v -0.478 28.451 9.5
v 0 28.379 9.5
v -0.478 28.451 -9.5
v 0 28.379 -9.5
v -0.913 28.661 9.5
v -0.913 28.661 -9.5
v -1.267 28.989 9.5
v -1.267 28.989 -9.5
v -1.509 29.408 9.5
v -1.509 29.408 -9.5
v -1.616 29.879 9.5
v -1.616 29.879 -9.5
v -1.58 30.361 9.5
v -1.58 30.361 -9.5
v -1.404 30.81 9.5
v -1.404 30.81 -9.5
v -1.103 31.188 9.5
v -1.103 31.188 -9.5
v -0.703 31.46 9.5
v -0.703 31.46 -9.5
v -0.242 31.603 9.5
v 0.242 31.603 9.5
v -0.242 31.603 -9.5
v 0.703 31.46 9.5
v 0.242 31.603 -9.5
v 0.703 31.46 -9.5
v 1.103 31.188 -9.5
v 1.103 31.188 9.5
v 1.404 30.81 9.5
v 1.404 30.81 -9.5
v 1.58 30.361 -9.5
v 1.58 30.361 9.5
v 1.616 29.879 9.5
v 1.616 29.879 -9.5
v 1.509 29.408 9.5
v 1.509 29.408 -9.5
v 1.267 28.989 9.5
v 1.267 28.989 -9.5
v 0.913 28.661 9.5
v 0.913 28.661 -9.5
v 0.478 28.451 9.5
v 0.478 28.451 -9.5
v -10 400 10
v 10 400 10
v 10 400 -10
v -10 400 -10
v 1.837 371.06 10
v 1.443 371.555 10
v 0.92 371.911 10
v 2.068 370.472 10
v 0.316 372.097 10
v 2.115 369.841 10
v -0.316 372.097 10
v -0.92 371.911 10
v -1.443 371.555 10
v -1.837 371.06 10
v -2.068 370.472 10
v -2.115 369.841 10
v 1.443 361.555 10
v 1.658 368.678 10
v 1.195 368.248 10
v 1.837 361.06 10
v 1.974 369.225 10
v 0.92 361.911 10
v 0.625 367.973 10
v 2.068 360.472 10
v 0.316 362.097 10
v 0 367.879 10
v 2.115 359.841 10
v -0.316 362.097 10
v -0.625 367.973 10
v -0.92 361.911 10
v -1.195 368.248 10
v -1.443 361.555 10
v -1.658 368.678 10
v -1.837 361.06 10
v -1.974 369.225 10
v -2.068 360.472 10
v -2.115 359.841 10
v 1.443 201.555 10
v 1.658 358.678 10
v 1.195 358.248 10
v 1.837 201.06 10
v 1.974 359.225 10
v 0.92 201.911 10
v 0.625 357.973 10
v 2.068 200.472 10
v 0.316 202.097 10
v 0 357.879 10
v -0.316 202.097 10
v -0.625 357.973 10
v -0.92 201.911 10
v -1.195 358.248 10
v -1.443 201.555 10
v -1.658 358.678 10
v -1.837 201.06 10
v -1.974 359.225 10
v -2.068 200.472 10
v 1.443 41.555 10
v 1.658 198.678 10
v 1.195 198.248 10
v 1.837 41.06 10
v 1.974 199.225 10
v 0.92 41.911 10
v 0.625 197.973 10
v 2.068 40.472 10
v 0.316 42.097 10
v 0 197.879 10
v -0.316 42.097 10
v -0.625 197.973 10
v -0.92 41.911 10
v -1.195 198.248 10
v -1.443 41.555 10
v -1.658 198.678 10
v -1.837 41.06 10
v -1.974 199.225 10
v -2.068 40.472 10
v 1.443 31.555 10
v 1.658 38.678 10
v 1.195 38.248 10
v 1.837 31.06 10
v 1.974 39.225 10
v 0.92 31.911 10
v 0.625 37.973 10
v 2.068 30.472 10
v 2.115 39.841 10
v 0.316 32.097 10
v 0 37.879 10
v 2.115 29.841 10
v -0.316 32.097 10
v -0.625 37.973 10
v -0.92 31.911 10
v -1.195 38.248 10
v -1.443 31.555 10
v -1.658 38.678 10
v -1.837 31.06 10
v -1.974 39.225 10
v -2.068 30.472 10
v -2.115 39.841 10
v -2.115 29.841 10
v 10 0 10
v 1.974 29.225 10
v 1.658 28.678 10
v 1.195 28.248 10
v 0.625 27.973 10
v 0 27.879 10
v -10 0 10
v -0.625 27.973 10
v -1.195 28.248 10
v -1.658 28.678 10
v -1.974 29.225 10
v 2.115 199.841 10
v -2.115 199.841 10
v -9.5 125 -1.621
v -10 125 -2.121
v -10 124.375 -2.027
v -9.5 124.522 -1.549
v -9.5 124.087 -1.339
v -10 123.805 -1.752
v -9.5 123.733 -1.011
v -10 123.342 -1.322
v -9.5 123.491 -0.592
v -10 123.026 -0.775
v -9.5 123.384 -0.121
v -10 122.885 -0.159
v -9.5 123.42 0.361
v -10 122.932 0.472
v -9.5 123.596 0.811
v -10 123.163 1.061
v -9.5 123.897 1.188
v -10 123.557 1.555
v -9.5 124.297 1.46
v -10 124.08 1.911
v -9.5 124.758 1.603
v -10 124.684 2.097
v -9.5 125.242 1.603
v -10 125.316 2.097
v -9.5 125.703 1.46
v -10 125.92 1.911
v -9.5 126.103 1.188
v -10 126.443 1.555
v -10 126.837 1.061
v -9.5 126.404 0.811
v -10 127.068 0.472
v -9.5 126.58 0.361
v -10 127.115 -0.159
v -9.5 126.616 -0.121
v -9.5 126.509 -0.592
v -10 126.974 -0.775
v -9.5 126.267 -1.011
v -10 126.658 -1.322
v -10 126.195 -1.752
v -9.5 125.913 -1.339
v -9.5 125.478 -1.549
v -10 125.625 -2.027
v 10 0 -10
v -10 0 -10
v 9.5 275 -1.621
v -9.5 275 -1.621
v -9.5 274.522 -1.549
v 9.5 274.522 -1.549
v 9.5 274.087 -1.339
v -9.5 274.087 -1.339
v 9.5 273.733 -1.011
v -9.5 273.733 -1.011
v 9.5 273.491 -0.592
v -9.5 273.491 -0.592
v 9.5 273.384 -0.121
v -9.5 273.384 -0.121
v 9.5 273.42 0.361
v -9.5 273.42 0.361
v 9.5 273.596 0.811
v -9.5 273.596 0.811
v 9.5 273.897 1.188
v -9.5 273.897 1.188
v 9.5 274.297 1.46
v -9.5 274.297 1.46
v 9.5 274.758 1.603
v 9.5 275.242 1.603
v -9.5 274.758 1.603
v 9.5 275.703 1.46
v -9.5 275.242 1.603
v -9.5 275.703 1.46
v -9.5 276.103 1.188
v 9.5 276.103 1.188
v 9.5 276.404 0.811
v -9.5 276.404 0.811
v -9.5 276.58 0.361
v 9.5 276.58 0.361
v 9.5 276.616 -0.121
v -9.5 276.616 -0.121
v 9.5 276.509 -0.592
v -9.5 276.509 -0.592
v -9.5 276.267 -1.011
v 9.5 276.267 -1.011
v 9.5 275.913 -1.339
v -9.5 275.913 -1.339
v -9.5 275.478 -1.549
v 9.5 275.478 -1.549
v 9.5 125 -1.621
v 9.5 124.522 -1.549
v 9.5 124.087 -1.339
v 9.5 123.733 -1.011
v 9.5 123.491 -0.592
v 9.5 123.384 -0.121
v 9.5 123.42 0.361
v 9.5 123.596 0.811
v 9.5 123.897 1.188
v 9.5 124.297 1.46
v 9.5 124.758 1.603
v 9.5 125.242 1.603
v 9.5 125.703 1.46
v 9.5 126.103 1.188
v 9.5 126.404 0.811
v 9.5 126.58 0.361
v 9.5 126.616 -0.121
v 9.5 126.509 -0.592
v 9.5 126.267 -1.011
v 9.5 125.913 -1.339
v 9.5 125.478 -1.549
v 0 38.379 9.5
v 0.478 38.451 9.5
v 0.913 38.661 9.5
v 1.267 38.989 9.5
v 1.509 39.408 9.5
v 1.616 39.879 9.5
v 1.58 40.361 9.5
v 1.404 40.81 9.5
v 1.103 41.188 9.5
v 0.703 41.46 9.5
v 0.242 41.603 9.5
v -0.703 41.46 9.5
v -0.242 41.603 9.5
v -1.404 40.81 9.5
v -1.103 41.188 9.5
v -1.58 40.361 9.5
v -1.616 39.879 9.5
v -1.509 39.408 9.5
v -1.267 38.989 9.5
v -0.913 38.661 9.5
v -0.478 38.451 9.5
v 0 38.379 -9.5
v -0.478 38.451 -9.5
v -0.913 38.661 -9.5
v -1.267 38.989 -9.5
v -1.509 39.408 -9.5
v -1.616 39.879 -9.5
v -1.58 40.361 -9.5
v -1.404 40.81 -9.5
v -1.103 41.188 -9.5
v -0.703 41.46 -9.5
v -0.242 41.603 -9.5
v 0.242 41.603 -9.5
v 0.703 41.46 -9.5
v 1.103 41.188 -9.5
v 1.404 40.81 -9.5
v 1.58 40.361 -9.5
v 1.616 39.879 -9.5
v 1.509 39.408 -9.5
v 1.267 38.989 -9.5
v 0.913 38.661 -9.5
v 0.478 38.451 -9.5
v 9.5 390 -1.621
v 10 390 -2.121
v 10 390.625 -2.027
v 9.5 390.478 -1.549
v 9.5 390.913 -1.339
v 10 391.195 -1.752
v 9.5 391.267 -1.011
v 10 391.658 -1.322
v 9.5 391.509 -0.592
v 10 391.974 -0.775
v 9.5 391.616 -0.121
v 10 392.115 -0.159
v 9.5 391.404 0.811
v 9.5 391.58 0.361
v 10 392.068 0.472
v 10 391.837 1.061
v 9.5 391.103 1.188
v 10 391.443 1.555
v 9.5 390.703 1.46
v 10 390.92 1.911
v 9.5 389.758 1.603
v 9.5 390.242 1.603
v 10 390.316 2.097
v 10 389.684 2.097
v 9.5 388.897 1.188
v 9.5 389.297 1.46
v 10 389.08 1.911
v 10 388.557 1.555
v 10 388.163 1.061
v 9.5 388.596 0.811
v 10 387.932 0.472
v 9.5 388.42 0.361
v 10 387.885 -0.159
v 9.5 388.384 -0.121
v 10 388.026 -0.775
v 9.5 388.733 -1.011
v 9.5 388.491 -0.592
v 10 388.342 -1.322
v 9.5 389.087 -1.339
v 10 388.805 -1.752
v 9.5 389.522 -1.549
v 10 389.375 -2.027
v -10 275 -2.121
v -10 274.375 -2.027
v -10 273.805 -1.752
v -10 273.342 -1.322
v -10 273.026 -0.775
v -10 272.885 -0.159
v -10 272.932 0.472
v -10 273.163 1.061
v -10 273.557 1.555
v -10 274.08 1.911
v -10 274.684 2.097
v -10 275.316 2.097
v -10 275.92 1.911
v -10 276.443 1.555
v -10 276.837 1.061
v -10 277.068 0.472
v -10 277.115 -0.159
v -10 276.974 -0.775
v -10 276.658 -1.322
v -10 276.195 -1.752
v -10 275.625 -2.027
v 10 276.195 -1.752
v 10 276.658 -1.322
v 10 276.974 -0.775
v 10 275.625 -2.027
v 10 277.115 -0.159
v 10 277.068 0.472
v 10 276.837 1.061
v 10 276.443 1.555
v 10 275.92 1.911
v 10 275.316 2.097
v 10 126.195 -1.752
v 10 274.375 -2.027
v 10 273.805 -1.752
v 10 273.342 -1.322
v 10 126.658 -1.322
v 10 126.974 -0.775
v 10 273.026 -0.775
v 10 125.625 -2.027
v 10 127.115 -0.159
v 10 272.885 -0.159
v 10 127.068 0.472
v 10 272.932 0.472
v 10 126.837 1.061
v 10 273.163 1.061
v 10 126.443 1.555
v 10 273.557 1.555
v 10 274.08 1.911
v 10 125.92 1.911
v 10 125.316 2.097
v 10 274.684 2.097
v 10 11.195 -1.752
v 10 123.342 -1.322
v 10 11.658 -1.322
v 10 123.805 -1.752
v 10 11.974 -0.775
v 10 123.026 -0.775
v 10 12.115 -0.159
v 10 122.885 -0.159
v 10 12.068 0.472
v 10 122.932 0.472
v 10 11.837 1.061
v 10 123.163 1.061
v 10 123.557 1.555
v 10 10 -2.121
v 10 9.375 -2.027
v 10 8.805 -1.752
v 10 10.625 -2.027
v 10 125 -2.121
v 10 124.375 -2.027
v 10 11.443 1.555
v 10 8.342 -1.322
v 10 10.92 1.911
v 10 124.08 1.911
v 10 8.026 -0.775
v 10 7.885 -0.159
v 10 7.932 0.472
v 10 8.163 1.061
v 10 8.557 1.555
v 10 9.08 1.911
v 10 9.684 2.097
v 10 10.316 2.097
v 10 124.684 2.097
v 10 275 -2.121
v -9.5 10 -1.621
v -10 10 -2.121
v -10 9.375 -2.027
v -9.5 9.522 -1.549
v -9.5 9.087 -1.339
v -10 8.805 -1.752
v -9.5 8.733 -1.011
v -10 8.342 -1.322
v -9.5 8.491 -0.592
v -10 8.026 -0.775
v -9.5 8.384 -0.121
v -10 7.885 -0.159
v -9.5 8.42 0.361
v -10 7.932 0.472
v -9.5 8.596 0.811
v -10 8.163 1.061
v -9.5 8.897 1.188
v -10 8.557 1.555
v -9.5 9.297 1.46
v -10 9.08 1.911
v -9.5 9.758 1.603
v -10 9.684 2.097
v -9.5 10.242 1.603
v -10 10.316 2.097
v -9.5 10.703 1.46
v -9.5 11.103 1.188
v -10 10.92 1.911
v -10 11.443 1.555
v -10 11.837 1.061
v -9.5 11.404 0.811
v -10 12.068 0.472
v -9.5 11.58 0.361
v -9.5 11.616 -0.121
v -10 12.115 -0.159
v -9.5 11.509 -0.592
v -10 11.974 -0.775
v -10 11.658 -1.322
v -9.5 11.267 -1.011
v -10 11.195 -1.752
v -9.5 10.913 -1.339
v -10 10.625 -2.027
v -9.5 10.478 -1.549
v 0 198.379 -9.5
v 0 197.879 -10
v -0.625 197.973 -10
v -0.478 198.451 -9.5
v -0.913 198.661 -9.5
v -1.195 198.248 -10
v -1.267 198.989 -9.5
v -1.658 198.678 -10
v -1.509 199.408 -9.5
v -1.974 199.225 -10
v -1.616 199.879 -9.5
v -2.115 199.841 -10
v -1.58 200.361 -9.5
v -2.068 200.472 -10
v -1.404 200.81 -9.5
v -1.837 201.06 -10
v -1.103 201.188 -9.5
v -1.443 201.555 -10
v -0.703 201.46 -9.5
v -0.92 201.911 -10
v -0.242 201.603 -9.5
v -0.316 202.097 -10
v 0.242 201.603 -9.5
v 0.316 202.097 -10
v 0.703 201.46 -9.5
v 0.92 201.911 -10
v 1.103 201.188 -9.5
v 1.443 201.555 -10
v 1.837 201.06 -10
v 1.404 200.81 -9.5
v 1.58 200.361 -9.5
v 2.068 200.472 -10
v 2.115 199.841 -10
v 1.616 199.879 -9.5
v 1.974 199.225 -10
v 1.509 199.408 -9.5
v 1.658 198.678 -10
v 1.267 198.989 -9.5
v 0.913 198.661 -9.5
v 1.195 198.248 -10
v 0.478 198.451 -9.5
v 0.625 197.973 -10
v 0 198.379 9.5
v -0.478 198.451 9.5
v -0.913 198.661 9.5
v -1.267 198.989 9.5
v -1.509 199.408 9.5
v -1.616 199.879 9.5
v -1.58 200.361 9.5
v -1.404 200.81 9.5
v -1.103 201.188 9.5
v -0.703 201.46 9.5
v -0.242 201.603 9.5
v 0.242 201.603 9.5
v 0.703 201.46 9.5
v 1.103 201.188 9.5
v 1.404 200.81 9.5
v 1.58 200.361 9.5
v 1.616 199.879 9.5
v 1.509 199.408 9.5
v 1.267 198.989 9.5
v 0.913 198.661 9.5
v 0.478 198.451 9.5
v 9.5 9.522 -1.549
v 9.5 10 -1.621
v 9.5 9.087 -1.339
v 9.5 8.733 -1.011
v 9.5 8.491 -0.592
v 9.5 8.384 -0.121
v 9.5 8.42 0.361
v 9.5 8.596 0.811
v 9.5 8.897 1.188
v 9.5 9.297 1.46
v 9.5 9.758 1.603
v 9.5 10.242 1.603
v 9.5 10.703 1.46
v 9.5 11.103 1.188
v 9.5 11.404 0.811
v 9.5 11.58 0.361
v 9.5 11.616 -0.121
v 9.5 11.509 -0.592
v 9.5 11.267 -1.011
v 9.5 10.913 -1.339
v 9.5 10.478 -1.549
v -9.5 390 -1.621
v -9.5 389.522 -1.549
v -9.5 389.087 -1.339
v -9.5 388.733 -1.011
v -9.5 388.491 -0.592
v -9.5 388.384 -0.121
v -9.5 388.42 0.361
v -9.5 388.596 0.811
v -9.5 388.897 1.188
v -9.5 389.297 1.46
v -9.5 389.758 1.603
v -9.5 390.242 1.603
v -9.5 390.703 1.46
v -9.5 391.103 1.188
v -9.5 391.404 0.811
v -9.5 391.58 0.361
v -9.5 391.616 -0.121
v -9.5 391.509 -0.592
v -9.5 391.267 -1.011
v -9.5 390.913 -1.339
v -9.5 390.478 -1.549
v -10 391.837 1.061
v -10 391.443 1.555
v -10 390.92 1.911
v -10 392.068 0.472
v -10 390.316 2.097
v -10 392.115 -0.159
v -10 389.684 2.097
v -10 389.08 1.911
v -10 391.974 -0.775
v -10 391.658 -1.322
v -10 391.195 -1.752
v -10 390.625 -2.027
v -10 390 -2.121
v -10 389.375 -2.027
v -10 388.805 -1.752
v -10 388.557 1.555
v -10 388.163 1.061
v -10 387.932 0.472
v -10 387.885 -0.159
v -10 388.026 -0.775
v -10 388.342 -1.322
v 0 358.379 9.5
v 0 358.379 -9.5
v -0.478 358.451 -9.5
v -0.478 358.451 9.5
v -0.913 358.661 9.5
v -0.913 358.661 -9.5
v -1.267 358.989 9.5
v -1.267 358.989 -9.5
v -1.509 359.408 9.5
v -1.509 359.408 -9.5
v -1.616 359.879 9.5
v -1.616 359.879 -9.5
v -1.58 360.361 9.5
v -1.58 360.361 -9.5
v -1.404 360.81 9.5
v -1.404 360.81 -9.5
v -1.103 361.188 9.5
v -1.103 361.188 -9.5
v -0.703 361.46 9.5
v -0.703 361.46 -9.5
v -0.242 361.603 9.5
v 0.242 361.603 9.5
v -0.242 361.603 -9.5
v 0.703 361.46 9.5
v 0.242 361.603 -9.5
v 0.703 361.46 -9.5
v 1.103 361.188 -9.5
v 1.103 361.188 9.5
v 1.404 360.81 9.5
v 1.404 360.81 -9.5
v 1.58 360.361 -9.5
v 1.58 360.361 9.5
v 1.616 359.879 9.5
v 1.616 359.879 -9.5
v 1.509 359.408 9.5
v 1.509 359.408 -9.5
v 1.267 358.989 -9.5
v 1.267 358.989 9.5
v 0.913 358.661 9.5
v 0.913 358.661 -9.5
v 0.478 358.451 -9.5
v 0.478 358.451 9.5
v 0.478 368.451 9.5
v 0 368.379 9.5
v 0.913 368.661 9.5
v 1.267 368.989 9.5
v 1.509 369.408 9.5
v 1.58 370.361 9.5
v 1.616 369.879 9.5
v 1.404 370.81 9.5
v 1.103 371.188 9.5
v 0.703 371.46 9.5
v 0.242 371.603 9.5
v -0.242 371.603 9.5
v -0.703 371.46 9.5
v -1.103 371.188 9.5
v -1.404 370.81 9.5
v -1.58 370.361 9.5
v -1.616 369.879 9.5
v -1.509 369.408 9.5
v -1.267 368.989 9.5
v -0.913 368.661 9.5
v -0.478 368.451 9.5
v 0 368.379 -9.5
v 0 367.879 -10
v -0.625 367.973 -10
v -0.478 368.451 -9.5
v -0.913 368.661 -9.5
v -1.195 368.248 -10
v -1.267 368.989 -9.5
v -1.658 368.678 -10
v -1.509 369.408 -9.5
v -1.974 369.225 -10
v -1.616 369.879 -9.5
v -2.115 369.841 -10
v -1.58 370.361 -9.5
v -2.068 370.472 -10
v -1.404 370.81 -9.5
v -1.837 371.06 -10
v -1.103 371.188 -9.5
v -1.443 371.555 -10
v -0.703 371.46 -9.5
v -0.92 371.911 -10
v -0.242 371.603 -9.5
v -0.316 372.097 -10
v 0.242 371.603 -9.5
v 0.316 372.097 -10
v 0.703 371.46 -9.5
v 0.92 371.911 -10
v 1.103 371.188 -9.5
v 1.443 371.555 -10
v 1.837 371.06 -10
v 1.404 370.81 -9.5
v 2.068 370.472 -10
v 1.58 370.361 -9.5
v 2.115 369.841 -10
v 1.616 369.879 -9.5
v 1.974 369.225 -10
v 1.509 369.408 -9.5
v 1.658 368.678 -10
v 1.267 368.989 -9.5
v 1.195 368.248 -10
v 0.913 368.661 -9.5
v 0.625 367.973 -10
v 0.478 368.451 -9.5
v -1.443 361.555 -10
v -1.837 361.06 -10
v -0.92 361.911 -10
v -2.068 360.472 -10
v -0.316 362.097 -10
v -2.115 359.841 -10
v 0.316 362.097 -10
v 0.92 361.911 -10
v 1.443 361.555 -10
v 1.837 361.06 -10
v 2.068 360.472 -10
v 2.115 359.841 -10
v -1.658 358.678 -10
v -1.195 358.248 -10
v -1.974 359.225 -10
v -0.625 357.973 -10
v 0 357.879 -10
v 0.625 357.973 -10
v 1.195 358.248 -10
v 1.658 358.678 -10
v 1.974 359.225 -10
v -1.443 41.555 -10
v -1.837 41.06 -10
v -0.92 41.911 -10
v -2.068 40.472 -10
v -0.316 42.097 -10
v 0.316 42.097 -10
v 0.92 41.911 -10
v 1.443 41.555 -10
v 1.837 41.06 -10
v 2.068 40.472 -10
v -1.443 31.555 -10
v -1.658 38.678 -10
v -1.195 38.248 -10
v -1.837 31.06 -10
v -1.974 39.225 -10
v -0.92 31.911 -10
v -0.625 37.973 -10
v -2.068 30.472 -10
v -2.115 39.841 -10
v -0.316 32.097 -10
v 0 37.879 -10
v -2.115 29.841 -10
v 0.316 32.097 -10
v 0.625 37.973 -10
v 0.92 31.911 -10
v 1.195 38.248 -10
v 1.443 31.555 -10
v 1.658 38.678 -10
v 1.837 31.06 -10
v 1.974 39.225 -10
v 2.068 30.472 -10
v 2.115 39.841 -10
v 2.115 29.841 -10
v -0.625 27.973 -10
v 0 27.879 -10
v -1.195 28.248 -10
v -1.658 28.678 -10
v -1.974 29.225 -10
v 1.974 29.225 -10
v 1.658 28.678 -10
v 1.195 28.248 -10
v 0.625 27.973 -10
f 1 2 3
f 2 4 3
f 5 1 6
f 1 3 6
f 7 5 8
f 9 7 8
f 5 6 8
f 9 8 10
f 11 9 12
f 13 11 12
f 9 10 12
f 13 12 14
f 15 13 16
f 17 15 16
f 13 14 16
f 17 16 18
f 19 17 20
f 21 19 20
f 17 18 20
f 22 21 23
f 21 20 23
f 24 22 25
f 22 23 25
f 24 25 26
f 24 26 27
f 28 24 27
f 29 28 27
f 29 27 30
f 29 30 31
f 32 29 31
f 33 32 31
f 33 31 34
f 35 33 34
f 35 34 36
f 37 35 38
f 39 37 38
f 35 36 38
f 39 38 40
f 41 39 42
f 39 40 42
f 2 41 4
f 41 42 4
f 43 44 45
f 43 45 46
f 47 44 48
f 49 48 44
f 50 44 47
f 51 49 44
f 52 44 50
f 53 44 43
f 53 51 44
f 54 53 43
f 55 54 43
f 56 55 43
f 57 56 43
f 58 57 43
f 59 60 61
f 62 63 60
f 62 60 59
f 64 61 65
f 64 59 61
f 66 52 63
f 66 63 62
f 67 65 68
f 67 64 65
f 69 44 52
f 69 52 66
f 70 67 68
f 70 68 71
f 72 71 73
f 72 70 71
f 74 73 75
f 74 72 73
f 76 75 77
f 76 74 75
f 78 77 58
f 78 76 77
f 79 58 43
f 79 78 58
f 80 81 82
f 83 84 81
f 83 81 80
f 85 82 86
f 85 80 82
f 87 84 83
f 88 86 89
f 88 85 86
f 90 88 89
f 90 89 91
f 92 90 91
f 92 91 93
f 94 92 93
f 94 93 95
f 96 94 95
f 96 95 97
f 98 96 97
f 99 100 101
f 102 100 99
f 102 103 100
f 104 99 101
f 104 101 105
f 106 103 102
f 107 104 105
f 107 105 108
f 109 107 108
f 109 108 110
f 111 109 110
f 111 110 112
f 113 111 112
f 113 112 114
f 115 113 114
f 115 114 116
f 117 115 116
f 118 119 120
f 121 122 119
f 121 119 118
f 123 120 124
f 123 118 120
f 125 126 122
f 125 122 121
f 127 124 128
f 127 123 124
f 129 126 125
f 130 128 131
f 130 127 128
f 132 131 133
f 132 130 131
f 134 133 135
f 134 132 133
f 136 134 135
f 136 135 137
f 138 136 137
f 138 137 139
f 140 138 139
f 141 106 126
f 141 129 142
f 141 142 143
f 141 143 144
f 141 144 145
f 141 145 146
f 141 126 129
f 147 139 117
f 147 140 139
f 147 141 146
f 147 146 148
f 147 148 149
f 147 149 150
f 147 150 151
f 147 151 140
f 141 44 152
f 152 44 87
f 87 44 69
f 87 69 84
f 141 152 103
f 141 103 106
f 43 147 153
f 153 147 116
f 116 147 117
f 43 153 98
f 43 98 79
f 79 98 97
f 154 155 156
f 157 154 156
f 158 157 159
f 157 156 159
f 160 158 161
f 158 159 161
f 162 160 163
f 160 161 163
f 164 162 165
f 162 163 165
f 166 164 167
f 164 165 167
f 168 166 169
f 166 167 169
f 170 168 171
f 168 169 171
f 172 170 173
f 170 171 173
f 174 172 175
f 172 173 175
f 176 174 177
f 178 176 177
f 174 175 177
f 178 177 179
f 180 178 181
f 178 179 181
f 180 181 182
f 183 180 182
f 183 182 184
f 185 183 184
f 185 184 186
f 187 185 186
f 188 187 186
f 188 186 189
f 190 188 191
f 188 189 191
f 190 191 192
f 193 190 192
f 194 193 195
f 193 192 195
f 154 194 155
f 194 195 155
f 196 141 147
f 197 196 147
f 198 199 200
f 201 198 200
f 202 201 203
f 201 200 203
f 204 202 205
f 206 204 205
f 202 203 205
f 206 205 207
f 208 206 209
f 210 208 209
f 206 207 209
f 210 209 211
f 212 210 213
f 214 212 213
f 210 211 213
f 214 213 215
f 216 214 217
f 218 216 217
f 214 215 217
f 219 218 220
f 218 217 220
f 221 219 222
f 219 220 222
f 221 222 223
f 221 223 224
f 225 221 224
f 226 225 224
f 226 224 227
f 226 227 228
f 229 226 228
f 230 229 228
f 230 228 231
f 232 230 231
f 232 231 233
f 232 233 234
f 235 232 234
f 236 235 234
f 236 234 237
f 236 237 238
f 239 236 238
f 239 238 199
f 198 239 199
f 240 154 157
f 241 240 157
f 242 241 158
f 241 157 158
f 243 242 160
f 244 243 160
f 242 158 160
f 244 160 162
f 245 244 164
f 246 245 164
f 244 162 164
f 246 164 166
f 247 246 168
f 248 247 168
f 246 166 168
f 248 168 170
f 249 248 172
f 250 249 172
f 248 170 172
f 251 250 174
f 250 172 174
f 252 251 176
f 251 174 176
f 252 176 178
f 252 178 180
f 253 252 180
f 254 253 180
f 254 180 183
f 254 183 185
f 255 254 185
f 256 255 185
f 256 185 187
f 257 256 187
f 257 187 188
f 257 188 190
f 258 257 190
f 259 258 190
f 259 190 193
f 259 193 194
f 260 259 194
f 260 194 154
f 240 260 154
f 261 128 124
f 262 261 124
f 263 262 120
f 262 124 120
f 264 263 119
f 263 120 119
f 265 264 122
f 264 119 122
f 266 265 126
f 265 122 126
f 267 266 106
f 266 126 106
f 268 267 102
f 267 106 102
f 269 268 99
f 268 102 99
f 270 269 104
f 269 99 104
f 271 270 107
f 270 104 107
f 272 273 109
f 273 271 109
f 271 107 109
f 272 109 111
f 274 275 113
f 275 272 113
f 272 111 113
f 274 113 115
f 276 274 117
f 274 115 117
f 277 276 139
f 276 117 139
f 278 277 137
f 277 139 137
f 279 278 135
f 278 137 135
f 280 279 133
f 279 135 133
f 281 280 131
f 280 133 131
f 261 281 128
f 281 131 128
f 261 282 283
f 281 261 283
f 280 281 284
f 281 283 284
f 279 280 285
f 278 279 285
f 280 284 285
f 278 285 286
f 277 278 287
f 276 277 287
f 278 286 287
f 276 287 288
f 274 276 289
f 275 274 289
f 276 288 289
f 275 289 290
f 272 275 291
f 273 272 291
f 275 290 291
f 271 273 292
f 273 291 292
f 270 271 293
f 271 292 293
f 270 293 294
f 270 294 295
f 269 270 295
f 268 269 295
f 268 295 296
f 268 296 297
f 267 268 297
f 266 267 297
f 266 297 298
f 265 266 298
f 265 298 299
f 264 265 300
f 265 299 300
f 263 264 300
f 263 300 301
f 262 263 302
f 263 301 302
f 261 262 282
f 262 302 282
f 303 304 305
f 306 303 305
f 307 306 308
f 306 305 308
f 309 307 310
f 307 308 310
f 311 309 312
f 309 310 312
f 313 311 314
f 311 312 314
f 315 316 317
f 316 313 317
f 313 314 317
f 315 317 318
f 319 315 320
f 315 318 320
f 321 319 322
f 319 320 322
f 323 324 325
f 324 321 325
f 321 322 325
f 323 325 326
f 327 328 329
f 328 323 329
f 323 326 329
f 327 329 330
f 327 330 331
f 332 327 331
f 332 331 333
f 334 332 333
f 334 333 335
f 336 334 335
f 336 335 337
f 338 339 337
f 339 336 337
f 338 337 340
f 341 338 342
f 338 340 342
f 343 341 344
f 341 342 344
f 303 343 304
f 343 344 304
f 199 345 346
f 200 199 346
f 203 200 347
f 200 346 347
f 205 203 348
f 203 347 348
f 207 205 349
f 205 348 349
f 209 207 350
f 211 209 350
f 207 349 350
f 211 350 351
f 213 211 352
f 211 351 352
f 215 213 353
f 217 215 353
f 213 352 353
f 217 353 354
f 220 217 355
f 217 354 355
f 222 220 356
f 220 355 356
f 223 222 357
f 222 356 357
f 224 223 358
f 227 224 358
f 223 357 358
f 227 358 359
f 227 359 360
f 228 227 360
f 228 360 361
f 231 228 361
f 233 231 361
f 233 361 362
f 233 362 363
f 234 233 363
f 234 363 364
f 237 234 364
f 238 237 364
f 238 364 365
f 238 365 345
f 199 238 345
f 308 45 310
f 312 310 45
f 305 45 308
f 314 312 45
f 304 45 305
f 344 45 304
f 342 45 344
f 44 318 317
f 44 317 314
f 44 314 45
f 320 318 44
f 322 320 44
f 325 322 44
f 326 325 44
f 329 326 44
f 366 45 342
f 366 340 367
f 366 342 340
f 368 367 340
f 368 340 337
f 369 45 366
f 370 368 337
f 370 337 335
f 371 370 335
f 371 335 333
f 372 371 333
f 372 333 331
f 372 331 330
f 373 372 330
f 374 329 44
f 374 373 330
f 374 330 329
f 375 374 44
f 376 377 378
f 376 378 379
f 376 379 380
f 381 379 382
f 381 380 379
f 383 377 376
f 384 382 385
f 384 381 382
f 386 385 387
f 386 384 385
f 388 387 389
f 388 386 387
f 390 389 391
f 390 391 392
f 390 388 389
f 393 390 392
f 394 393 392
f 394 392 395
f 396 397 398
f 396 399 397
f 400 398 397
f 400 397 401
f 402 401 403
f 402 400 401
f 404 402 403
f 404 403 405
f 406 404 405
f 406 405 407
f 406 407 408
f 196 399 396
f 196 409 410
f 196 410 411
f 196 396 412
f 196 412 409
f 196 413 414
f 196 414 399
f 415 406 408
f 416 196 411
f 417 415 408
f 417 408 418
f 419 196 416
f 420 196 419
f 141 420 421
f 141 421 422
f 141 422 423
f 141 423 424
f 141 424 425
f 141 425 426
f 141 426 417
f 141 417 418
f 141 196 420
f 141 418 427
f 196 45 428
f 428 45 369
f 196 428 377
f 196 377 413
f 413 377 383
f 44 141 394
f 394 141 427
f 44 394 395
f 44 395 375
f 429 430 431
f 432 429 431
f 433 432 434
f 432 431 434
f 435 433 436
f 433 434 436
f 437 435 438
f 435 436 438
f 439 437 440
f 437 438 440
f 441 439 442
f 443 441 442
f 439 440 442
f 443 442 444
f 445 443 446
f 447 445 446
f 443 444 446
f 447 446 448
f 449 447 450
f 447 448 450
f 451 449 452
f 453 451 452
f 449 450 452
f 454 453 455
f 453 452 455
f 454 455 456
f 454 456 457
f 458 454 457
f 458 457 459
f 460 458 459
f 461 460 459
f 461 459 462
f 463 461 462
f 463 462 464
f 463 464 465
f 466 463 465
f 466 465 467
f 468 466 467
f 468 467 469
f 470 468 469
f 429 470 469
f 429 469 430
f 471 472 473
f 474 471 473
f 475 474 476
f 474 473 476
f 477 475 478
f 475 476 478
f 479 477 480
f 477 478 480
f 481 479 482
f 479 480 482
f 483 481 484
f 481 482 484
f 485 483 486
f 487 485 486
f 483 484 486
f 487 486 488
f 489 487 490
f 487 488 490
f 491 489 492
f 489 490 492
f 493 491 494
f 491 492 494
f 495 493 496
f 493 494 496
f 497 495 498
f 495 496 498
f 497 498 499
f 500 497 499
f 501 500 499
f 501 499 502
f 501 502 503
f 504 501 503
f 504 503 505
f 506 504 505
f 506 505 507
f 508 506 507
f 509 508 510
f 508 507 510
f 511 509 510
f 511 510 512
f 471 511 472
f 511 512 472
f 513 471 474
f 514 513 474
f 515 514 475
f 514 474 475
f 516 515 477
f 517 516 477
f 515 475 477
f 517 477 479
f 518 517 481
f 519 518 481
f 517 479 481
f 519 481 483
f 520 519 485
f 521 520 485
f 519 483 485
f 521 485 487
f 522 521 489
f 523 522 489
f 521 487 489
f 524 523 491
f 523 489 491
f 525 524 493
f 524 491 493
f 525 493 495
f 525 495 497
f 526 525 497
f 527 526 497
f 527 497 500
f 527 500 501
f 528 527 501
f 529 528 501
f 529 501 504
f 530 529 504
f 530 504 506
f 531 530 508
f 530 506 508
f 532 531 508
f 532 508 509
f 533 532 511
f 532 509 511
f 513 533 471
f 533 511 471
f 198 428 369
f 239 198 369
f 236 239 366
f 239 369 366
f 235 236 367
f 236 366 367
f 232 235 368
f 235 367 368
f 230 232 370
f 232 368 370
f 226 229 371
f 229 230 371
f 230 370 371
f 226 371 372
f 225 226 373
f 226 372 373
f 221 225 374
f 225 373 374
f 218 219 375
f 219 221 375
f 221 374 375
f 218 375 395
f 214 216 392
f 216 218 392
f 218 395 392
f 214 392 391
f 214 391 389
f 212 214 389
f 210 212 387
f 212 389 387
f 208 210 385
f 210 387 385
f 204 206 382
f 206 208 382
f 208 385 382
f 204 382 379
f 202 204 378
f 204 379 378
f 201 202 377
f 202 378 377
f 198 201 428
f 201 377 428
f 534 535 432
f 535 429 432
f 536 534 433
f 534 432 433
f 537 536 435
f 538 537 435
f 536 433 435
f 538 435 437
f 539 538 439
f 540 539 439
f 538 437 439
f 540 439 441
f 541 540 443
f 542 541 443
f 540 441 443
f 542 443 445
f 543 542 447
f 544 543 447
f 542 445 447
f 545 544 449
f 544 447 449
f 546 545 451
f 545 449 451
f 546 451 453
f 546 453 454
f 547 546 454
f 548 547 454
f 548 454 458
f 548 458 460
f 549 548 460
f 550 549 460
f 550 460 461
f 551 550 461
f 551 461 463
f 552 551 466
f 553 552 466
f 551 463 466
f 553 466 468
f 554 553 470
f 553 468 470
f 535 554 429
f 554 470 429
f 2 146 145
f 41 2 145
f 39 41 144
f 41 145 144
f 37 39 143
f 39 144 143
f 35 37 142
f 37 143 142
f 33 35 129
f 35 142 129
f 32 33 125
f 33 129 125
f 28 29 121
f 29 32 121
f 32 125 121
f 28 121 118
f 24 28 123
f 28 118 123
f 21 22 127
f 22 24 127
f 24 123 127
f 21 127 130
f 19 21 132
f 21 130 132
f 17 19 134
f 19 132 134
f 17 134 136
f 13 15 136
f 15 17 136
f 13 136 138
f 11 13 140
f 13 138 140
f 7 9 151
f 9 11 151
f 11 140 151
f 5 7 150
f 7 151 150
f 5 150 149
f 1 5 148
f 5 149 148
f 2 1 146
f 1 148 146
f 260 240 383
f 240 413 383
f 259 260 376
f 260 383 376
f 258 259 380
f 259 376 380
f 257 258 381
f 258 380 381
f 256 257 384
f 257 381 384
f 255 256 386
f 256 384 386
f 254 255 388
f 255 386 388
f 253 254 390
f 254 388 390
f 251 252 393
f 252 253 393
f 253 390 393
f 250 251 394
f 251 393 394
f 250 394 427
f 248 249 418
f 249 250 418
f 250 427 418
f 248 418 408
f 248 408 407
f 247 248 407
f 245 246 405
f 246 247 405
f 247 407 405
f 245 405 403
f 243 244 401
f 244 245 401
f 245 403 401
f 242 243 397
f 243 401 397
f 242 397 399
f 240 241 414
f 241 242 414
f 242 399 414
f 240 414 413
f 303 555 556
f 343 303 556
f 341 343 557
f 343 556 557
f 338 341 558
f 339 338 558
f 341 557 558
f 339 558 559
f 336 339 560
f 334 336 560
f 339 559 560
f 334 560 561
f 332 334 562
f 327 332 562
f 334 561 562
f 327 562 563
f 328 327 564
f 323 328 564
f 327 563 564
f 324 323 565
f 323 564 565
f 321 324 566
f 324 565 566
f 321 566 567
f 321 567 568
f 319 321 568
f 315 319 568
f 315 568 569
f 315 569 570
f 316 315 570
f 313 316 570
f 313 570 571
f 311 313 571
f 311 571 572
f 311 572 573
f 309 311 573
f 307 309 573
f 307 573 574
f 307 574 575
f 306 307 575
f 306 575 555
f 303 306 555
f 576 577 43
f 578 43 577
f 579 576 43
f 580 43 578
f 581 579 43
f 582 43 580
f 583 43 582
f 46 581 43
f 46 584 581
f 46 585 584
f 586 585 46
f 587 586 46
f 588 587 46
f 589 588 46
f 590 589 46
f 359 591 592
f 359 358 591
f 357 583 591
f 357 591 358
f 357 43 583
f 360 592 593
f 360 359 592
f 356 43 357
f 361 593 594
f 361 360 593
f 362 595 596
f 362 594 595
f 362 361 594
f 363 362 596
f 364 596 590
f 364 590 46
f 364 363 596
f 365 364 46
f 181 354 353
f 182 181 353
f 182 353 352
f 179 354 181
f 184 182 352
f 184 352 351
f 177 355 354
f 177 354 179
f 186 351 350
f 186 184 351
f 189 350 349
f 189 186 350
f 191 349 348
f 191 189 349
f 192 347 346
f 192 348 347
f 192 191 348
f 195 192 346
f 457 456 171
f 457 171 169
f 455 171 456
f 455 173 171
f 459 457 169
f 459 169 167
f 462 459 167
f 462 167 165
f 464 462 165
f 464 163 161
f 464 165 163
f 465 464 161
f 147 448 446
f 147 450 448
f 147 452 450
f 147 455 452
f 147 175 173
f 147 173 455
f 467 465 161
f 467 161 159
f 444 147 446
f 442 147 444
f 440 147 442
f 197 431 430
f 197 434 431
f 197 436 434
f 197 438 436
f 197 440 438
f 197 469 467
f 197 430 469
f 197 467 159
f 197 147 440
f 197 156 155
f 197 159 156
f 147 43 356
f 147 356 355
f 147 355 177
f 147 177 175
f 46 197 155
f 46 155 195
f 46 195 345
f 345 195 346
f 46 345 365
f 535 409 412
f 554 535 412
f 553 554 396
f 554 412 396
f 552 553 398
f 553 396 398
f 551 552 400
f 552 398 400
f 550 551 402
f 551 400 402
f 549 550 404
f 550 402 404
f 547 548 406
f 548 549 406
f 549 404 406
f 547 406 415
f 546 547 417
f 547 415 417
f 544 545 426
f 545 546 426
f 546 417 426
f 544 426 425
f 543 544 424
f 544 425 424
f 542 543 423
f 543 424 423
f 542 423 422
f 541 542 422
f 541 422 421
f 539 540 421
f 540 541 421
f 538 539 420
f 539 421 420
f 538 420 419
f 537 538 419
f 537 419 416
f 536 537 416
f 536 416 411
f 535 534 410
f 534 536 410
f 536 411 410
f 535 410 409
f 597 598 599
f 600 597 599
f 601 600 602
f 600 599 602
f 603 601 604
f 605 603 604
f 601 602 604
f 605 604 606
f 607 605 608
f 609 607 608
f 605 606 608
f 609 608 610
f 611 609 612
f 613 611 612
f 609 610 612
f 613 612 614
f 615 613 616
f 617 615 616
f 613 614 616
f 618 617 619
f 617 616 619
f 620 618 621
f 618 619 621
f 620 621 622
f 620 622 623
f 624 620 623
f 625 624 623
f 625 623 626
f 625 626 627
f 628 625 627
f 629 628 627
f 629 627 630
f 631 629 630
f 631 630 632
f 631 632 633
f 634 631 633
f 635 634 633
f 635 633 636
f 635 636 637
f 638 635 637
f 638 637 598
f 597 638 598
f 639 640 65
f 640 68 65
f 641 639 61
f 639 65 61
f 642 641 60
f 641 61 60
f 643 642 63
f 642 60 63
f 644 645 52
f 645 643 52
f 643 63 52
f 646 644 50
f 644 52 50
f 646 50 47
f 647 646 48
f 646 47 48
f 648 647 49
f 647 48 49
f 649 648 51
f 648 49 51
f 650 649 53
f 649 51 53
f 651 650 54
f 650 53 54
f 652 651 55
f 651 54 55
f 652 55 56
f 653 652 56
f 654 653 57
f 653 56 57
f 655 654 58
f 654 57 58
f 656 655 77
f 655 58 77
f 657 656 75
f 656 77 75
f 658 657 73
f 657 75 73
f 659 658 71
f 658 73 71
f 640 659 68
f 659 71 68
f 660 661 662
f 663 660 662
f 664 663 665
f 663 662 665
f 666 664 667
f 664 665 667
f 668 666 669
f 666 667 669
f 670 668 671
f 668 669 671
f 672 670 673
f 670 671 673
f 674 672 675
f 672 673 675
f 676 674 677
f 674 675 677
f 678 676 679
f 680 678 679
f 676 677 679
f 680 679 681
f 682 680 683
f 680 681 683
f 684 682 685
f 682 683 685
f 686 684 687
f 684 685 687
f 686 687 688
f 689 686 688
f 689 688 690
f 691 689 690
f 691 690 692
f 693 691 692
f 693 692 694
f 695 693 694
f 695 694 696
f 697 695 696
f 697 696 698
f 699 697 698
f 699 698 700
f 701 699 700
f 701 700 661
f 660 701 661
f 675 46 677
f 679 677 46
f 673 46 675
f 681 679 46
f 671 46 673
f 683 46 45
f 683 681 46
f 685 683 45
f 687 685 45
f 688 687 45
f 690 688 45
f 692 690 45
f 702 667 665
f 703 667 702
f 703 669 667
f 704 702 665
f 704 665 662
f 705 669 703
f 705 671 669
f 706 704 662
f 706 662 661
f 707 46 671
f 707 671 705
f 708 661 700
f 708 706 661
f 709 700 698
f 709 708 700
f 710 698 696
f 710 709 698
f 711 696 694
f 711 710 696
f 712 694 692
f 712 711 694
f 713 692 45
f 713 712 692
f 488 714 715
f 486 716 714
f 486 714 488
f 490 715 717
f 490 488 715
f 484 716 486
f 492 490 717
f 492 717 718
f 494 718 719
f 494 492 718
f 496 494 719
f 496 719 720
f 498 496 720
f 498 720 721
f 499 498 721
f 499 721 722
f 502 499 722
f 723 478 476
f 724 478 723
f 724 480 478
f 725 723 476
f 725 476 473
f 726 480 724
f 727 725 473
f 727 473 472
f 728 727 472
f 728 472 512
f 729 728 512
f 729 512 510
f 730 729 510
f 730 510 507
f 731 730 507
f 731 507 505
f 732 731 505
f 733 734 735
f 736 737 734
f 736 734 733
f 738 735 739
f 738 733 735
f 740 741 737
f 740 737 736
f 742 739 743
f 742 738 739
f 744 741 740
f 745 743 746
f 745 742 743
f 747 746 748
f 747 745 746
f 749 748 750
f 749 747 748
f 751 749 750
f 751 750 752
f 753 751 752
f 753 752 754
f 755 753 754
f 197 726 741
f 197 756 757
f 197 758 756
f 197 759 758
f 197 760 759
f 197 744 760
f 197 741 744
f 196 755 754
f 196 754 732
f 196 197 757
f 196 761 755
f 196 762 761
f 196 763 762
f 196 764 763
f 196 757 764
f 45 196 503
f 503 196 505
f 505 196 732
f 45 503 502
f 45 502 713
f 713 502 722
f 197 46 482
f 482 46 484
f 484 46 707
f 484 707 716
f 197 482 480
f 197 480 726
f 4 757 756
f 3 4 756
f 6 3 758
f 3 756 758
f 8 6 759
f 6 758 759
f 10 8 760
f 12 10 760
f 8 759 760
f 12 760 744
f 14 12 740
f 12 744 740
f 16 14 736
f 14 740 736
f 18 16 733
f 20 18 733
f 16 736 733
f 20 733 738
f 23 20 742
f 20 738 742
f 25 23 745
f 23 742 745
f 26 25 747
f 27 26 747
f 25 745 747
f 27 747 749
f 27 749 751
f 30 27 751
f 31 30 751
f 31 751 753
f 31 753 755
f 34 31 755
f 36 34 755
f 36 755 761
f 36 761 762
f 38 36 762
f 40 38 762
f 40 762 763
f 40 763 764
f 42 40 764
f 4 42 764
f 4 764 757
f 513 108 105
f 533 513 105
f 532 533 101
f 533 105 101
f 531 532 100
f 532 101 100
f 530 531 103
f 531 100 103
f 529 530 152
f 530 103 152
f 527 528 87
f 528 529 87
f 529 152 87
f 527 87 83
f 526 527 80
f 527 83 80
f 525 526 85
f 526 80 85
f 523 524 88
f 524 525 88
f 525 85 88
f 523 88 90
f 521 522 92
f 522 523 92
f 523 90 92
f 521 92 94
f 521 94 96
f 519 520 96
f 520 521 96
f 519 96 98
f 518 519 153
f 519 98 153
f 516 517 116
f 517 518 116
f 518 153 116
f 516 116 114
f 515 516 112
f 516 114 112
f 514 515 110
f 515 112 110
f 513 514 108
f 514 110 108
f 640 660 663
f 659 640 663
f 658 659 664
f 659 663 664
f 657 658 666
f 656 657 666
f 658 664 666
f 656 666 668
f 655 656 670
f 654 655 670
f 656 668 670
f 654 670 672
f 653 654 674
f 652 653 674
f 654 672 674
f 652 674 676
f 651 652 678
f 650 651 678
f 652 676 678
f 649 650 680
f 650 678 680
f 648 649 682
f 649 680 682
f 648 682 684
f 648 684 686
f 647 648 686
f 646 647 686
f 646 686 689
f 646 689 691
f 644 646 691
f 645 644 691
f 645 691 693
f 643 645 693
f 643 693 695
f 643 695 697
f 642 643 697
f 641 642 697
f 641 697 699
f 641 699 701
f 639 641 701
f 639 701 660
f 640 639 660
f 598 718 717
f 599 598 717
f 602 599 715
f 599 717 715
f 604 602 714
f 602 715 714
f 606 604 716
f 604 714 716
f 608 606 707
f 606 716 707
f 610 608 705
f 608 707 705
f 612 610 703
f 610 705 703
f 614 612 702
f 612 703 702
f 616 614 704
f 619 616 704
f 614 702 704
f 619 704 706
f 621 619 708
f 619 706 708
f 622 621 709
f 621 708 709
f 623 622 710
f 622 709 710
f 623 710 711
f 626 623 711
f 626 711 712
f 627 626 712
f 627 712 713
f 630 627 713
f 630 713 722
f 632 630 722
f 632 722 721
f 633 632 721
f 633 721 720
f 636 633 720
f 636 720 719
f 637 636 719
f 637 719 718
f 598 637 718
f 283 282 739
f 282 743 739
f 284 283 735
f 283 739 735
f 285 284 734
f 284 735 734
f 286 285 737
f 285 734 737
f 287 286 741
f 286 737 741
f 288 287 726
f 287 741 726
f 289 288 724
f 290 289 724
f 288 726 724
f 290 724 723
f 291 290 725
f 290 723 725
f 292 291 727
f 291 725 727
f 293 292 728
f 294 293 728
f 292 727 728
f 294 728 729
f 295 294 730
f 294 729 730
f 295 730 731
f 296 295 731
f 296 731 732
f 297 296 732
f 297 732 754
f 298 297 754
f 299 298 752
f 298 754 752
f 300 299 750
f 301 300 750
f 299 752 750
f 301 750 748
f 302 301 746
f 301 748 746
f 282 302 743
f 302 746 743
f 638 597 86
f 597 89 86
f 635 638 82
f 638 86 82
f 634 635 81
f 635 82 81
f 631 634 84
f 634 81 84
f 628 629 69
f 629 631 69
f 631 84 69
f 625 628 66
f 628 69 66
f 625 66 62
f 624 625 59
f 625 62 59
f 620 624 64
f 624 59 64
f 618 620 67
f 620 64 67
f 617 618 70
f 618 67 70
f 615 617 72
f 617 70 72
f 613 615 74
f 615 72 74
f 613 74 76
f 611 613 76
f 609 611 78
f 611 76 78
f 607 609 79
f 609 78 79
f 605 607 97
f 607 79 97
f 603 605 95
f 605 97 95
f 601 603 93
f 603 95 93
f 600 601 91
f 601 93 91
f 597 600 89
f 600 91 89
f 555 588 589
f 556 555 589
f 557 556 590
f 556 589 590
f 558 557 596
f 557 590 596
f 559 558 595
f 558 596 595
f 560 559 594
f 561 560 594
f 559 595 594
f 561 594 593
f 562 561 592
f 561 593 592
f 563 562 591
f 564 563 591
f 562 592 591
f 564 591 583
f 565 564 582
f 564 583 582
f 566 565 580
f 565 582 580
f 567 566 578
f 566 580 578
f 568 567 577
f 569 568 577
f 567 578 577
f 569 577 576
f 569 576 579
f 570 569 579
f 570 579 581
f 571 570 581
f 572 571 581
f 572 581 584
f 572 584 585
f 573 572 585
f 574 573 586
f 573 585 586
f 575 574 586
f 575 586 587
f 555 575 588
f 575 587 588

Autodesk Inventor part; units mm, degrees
ref_plane "YZ Plane" through (0, 0, 0) normal (1, 0, 0) x (0, 1, 0)
ref_plane "XZ Plane" through (0, 0, 0) normal (0, 1, 0) x (-1, 0, 0)
ref_plane "XY Plane" through (0, 0, 0) normal (0, 0, 1) x (1, 0, 0)
sketch "Sketch1" plane through (0, 0, 0) normal (0, 1, 0) x (-1, 0, 0)
  line L0 (-10, 10) -> (10, 10)
  line L1 (10, 10) -> (10, -10)
  line L2 (10, -10) -> (-10, -10)
  line L3 (-10, -10) -> (-10, 10)
  line L4 (-10, 10) -> (10, -10) construction
  line L5 (10, 10) -> (-10, -10) construction
  point P0 (0, 0)
  dimension "d0" = 20
  dimension "d1" = 20
extrude "Extrusion1" add sketch "Sketch1" along normal blind 400
sketch "Sketch2" plane through (10, 0, 10) normal (1, 0, 0) x (0, 0, -1)
  line L0 (10, 0) -> (10, 10)
  line L1 (10, 10) -> (10, 125)
  line L2 (10, 125) -> (10, 275)
  line L3 (10, 275) -> (10, 390)
  dimension "d4" = 10
  dimension "d5" = 115
  dimension "d6" = 150
  dimension "d7" = 180
  dimension "d8" = 115
  dimension "d9" = 180
hole "Hole1" at (10, 10, 0) at (10, 125, 0) at (10, 275, 0) at (10, 390, 0) direction (-1, 0, 0) diameter 3.242 end through all thread size "M4x0.7" class "6H" standard "ANSI Metric M Profile"
sketch "Sketch3" plane through (-10, 0, 10) normal (0, 0, 1) x (1, 0, 0)
  line L0 (10, 0) -> (10, 30)
  line L1 (10, 0) -> (40, 0) construction
  line L2 (10, 30) -> (10, 370)
  dimension "d17" = 30
  dimension "d18" = 90
  dimension "d19" = 340
  dimension "d20" = 180
hole "Hole2" at (0, 30, 10) at (0, 370, 10) direction (0, 0, -1) diameter 3.242 depth 47.25 tip angle 118 thread size "M4x0.7" class "6H" standard "ANSI Metric M Profile"
sketch "Sketch4" plane through (-10, 0, 10) normal (0, 0, 1) x (1, 0, 0)
  circle A0 centre (10, 30) radius 1.621 projected
  line L0 (10, 30) -> (10, 40)
  circle A1 centre (10, 370) radius 1.621 projected
  line L1 (10, 370) -> (10, 360)
  point P0 (10, 0)
  dimension "d37" = 10
  dimension "d38" = 10
hole "Hole3" at (0, 40, 10) at (0, 360, 10) direction (0, 0, -1) diameter 3.242 depth 51.25 tip angle 118 thread size "M4x0.7" class "6H" standard "ANSI Metric M Profile"
sketch "Sketch5" plane through (-10, 0, 10) normal (0, 0, 1) x (1, 0, 0)
  line L0 (20, 400) -> (0, 400) projected
  line L1 (10, 400) -> (10, 0)
  circle A0 centre (10, 200) radius 43.7231
hole "Hole4" at (0, 200, 10) direction (0, 0, -1) diameter 3.242 depth 57.3 tip angle 118 thread size "M4x0.7" class "6H" standard "ANSI Metric M Profile"
chamfer "Chamfer1" distance 0.5 angle 45 18 edges at (10, 390, 1.621) (10, 275, 1.621) (10, 125, 1.621) (10, 10, 1.621) (0, 371.621, 10) (0, 31.621, 10) (0, 361.621, 10) (0, 41.621, 10) (0, 201.621, 10) (0, 201.621, -10) (0, 361.621, -10) (0, 41.621, -10) (0, 371.621, -10) (0, 31.621, -10) (-10, 390, 1.621) (-10, 275, 1.621) (-10, 125, 1.621) (-10, 10, 1.621)
properties part number "aluminium_stafmateriaal" material "Aluminum 6061"
